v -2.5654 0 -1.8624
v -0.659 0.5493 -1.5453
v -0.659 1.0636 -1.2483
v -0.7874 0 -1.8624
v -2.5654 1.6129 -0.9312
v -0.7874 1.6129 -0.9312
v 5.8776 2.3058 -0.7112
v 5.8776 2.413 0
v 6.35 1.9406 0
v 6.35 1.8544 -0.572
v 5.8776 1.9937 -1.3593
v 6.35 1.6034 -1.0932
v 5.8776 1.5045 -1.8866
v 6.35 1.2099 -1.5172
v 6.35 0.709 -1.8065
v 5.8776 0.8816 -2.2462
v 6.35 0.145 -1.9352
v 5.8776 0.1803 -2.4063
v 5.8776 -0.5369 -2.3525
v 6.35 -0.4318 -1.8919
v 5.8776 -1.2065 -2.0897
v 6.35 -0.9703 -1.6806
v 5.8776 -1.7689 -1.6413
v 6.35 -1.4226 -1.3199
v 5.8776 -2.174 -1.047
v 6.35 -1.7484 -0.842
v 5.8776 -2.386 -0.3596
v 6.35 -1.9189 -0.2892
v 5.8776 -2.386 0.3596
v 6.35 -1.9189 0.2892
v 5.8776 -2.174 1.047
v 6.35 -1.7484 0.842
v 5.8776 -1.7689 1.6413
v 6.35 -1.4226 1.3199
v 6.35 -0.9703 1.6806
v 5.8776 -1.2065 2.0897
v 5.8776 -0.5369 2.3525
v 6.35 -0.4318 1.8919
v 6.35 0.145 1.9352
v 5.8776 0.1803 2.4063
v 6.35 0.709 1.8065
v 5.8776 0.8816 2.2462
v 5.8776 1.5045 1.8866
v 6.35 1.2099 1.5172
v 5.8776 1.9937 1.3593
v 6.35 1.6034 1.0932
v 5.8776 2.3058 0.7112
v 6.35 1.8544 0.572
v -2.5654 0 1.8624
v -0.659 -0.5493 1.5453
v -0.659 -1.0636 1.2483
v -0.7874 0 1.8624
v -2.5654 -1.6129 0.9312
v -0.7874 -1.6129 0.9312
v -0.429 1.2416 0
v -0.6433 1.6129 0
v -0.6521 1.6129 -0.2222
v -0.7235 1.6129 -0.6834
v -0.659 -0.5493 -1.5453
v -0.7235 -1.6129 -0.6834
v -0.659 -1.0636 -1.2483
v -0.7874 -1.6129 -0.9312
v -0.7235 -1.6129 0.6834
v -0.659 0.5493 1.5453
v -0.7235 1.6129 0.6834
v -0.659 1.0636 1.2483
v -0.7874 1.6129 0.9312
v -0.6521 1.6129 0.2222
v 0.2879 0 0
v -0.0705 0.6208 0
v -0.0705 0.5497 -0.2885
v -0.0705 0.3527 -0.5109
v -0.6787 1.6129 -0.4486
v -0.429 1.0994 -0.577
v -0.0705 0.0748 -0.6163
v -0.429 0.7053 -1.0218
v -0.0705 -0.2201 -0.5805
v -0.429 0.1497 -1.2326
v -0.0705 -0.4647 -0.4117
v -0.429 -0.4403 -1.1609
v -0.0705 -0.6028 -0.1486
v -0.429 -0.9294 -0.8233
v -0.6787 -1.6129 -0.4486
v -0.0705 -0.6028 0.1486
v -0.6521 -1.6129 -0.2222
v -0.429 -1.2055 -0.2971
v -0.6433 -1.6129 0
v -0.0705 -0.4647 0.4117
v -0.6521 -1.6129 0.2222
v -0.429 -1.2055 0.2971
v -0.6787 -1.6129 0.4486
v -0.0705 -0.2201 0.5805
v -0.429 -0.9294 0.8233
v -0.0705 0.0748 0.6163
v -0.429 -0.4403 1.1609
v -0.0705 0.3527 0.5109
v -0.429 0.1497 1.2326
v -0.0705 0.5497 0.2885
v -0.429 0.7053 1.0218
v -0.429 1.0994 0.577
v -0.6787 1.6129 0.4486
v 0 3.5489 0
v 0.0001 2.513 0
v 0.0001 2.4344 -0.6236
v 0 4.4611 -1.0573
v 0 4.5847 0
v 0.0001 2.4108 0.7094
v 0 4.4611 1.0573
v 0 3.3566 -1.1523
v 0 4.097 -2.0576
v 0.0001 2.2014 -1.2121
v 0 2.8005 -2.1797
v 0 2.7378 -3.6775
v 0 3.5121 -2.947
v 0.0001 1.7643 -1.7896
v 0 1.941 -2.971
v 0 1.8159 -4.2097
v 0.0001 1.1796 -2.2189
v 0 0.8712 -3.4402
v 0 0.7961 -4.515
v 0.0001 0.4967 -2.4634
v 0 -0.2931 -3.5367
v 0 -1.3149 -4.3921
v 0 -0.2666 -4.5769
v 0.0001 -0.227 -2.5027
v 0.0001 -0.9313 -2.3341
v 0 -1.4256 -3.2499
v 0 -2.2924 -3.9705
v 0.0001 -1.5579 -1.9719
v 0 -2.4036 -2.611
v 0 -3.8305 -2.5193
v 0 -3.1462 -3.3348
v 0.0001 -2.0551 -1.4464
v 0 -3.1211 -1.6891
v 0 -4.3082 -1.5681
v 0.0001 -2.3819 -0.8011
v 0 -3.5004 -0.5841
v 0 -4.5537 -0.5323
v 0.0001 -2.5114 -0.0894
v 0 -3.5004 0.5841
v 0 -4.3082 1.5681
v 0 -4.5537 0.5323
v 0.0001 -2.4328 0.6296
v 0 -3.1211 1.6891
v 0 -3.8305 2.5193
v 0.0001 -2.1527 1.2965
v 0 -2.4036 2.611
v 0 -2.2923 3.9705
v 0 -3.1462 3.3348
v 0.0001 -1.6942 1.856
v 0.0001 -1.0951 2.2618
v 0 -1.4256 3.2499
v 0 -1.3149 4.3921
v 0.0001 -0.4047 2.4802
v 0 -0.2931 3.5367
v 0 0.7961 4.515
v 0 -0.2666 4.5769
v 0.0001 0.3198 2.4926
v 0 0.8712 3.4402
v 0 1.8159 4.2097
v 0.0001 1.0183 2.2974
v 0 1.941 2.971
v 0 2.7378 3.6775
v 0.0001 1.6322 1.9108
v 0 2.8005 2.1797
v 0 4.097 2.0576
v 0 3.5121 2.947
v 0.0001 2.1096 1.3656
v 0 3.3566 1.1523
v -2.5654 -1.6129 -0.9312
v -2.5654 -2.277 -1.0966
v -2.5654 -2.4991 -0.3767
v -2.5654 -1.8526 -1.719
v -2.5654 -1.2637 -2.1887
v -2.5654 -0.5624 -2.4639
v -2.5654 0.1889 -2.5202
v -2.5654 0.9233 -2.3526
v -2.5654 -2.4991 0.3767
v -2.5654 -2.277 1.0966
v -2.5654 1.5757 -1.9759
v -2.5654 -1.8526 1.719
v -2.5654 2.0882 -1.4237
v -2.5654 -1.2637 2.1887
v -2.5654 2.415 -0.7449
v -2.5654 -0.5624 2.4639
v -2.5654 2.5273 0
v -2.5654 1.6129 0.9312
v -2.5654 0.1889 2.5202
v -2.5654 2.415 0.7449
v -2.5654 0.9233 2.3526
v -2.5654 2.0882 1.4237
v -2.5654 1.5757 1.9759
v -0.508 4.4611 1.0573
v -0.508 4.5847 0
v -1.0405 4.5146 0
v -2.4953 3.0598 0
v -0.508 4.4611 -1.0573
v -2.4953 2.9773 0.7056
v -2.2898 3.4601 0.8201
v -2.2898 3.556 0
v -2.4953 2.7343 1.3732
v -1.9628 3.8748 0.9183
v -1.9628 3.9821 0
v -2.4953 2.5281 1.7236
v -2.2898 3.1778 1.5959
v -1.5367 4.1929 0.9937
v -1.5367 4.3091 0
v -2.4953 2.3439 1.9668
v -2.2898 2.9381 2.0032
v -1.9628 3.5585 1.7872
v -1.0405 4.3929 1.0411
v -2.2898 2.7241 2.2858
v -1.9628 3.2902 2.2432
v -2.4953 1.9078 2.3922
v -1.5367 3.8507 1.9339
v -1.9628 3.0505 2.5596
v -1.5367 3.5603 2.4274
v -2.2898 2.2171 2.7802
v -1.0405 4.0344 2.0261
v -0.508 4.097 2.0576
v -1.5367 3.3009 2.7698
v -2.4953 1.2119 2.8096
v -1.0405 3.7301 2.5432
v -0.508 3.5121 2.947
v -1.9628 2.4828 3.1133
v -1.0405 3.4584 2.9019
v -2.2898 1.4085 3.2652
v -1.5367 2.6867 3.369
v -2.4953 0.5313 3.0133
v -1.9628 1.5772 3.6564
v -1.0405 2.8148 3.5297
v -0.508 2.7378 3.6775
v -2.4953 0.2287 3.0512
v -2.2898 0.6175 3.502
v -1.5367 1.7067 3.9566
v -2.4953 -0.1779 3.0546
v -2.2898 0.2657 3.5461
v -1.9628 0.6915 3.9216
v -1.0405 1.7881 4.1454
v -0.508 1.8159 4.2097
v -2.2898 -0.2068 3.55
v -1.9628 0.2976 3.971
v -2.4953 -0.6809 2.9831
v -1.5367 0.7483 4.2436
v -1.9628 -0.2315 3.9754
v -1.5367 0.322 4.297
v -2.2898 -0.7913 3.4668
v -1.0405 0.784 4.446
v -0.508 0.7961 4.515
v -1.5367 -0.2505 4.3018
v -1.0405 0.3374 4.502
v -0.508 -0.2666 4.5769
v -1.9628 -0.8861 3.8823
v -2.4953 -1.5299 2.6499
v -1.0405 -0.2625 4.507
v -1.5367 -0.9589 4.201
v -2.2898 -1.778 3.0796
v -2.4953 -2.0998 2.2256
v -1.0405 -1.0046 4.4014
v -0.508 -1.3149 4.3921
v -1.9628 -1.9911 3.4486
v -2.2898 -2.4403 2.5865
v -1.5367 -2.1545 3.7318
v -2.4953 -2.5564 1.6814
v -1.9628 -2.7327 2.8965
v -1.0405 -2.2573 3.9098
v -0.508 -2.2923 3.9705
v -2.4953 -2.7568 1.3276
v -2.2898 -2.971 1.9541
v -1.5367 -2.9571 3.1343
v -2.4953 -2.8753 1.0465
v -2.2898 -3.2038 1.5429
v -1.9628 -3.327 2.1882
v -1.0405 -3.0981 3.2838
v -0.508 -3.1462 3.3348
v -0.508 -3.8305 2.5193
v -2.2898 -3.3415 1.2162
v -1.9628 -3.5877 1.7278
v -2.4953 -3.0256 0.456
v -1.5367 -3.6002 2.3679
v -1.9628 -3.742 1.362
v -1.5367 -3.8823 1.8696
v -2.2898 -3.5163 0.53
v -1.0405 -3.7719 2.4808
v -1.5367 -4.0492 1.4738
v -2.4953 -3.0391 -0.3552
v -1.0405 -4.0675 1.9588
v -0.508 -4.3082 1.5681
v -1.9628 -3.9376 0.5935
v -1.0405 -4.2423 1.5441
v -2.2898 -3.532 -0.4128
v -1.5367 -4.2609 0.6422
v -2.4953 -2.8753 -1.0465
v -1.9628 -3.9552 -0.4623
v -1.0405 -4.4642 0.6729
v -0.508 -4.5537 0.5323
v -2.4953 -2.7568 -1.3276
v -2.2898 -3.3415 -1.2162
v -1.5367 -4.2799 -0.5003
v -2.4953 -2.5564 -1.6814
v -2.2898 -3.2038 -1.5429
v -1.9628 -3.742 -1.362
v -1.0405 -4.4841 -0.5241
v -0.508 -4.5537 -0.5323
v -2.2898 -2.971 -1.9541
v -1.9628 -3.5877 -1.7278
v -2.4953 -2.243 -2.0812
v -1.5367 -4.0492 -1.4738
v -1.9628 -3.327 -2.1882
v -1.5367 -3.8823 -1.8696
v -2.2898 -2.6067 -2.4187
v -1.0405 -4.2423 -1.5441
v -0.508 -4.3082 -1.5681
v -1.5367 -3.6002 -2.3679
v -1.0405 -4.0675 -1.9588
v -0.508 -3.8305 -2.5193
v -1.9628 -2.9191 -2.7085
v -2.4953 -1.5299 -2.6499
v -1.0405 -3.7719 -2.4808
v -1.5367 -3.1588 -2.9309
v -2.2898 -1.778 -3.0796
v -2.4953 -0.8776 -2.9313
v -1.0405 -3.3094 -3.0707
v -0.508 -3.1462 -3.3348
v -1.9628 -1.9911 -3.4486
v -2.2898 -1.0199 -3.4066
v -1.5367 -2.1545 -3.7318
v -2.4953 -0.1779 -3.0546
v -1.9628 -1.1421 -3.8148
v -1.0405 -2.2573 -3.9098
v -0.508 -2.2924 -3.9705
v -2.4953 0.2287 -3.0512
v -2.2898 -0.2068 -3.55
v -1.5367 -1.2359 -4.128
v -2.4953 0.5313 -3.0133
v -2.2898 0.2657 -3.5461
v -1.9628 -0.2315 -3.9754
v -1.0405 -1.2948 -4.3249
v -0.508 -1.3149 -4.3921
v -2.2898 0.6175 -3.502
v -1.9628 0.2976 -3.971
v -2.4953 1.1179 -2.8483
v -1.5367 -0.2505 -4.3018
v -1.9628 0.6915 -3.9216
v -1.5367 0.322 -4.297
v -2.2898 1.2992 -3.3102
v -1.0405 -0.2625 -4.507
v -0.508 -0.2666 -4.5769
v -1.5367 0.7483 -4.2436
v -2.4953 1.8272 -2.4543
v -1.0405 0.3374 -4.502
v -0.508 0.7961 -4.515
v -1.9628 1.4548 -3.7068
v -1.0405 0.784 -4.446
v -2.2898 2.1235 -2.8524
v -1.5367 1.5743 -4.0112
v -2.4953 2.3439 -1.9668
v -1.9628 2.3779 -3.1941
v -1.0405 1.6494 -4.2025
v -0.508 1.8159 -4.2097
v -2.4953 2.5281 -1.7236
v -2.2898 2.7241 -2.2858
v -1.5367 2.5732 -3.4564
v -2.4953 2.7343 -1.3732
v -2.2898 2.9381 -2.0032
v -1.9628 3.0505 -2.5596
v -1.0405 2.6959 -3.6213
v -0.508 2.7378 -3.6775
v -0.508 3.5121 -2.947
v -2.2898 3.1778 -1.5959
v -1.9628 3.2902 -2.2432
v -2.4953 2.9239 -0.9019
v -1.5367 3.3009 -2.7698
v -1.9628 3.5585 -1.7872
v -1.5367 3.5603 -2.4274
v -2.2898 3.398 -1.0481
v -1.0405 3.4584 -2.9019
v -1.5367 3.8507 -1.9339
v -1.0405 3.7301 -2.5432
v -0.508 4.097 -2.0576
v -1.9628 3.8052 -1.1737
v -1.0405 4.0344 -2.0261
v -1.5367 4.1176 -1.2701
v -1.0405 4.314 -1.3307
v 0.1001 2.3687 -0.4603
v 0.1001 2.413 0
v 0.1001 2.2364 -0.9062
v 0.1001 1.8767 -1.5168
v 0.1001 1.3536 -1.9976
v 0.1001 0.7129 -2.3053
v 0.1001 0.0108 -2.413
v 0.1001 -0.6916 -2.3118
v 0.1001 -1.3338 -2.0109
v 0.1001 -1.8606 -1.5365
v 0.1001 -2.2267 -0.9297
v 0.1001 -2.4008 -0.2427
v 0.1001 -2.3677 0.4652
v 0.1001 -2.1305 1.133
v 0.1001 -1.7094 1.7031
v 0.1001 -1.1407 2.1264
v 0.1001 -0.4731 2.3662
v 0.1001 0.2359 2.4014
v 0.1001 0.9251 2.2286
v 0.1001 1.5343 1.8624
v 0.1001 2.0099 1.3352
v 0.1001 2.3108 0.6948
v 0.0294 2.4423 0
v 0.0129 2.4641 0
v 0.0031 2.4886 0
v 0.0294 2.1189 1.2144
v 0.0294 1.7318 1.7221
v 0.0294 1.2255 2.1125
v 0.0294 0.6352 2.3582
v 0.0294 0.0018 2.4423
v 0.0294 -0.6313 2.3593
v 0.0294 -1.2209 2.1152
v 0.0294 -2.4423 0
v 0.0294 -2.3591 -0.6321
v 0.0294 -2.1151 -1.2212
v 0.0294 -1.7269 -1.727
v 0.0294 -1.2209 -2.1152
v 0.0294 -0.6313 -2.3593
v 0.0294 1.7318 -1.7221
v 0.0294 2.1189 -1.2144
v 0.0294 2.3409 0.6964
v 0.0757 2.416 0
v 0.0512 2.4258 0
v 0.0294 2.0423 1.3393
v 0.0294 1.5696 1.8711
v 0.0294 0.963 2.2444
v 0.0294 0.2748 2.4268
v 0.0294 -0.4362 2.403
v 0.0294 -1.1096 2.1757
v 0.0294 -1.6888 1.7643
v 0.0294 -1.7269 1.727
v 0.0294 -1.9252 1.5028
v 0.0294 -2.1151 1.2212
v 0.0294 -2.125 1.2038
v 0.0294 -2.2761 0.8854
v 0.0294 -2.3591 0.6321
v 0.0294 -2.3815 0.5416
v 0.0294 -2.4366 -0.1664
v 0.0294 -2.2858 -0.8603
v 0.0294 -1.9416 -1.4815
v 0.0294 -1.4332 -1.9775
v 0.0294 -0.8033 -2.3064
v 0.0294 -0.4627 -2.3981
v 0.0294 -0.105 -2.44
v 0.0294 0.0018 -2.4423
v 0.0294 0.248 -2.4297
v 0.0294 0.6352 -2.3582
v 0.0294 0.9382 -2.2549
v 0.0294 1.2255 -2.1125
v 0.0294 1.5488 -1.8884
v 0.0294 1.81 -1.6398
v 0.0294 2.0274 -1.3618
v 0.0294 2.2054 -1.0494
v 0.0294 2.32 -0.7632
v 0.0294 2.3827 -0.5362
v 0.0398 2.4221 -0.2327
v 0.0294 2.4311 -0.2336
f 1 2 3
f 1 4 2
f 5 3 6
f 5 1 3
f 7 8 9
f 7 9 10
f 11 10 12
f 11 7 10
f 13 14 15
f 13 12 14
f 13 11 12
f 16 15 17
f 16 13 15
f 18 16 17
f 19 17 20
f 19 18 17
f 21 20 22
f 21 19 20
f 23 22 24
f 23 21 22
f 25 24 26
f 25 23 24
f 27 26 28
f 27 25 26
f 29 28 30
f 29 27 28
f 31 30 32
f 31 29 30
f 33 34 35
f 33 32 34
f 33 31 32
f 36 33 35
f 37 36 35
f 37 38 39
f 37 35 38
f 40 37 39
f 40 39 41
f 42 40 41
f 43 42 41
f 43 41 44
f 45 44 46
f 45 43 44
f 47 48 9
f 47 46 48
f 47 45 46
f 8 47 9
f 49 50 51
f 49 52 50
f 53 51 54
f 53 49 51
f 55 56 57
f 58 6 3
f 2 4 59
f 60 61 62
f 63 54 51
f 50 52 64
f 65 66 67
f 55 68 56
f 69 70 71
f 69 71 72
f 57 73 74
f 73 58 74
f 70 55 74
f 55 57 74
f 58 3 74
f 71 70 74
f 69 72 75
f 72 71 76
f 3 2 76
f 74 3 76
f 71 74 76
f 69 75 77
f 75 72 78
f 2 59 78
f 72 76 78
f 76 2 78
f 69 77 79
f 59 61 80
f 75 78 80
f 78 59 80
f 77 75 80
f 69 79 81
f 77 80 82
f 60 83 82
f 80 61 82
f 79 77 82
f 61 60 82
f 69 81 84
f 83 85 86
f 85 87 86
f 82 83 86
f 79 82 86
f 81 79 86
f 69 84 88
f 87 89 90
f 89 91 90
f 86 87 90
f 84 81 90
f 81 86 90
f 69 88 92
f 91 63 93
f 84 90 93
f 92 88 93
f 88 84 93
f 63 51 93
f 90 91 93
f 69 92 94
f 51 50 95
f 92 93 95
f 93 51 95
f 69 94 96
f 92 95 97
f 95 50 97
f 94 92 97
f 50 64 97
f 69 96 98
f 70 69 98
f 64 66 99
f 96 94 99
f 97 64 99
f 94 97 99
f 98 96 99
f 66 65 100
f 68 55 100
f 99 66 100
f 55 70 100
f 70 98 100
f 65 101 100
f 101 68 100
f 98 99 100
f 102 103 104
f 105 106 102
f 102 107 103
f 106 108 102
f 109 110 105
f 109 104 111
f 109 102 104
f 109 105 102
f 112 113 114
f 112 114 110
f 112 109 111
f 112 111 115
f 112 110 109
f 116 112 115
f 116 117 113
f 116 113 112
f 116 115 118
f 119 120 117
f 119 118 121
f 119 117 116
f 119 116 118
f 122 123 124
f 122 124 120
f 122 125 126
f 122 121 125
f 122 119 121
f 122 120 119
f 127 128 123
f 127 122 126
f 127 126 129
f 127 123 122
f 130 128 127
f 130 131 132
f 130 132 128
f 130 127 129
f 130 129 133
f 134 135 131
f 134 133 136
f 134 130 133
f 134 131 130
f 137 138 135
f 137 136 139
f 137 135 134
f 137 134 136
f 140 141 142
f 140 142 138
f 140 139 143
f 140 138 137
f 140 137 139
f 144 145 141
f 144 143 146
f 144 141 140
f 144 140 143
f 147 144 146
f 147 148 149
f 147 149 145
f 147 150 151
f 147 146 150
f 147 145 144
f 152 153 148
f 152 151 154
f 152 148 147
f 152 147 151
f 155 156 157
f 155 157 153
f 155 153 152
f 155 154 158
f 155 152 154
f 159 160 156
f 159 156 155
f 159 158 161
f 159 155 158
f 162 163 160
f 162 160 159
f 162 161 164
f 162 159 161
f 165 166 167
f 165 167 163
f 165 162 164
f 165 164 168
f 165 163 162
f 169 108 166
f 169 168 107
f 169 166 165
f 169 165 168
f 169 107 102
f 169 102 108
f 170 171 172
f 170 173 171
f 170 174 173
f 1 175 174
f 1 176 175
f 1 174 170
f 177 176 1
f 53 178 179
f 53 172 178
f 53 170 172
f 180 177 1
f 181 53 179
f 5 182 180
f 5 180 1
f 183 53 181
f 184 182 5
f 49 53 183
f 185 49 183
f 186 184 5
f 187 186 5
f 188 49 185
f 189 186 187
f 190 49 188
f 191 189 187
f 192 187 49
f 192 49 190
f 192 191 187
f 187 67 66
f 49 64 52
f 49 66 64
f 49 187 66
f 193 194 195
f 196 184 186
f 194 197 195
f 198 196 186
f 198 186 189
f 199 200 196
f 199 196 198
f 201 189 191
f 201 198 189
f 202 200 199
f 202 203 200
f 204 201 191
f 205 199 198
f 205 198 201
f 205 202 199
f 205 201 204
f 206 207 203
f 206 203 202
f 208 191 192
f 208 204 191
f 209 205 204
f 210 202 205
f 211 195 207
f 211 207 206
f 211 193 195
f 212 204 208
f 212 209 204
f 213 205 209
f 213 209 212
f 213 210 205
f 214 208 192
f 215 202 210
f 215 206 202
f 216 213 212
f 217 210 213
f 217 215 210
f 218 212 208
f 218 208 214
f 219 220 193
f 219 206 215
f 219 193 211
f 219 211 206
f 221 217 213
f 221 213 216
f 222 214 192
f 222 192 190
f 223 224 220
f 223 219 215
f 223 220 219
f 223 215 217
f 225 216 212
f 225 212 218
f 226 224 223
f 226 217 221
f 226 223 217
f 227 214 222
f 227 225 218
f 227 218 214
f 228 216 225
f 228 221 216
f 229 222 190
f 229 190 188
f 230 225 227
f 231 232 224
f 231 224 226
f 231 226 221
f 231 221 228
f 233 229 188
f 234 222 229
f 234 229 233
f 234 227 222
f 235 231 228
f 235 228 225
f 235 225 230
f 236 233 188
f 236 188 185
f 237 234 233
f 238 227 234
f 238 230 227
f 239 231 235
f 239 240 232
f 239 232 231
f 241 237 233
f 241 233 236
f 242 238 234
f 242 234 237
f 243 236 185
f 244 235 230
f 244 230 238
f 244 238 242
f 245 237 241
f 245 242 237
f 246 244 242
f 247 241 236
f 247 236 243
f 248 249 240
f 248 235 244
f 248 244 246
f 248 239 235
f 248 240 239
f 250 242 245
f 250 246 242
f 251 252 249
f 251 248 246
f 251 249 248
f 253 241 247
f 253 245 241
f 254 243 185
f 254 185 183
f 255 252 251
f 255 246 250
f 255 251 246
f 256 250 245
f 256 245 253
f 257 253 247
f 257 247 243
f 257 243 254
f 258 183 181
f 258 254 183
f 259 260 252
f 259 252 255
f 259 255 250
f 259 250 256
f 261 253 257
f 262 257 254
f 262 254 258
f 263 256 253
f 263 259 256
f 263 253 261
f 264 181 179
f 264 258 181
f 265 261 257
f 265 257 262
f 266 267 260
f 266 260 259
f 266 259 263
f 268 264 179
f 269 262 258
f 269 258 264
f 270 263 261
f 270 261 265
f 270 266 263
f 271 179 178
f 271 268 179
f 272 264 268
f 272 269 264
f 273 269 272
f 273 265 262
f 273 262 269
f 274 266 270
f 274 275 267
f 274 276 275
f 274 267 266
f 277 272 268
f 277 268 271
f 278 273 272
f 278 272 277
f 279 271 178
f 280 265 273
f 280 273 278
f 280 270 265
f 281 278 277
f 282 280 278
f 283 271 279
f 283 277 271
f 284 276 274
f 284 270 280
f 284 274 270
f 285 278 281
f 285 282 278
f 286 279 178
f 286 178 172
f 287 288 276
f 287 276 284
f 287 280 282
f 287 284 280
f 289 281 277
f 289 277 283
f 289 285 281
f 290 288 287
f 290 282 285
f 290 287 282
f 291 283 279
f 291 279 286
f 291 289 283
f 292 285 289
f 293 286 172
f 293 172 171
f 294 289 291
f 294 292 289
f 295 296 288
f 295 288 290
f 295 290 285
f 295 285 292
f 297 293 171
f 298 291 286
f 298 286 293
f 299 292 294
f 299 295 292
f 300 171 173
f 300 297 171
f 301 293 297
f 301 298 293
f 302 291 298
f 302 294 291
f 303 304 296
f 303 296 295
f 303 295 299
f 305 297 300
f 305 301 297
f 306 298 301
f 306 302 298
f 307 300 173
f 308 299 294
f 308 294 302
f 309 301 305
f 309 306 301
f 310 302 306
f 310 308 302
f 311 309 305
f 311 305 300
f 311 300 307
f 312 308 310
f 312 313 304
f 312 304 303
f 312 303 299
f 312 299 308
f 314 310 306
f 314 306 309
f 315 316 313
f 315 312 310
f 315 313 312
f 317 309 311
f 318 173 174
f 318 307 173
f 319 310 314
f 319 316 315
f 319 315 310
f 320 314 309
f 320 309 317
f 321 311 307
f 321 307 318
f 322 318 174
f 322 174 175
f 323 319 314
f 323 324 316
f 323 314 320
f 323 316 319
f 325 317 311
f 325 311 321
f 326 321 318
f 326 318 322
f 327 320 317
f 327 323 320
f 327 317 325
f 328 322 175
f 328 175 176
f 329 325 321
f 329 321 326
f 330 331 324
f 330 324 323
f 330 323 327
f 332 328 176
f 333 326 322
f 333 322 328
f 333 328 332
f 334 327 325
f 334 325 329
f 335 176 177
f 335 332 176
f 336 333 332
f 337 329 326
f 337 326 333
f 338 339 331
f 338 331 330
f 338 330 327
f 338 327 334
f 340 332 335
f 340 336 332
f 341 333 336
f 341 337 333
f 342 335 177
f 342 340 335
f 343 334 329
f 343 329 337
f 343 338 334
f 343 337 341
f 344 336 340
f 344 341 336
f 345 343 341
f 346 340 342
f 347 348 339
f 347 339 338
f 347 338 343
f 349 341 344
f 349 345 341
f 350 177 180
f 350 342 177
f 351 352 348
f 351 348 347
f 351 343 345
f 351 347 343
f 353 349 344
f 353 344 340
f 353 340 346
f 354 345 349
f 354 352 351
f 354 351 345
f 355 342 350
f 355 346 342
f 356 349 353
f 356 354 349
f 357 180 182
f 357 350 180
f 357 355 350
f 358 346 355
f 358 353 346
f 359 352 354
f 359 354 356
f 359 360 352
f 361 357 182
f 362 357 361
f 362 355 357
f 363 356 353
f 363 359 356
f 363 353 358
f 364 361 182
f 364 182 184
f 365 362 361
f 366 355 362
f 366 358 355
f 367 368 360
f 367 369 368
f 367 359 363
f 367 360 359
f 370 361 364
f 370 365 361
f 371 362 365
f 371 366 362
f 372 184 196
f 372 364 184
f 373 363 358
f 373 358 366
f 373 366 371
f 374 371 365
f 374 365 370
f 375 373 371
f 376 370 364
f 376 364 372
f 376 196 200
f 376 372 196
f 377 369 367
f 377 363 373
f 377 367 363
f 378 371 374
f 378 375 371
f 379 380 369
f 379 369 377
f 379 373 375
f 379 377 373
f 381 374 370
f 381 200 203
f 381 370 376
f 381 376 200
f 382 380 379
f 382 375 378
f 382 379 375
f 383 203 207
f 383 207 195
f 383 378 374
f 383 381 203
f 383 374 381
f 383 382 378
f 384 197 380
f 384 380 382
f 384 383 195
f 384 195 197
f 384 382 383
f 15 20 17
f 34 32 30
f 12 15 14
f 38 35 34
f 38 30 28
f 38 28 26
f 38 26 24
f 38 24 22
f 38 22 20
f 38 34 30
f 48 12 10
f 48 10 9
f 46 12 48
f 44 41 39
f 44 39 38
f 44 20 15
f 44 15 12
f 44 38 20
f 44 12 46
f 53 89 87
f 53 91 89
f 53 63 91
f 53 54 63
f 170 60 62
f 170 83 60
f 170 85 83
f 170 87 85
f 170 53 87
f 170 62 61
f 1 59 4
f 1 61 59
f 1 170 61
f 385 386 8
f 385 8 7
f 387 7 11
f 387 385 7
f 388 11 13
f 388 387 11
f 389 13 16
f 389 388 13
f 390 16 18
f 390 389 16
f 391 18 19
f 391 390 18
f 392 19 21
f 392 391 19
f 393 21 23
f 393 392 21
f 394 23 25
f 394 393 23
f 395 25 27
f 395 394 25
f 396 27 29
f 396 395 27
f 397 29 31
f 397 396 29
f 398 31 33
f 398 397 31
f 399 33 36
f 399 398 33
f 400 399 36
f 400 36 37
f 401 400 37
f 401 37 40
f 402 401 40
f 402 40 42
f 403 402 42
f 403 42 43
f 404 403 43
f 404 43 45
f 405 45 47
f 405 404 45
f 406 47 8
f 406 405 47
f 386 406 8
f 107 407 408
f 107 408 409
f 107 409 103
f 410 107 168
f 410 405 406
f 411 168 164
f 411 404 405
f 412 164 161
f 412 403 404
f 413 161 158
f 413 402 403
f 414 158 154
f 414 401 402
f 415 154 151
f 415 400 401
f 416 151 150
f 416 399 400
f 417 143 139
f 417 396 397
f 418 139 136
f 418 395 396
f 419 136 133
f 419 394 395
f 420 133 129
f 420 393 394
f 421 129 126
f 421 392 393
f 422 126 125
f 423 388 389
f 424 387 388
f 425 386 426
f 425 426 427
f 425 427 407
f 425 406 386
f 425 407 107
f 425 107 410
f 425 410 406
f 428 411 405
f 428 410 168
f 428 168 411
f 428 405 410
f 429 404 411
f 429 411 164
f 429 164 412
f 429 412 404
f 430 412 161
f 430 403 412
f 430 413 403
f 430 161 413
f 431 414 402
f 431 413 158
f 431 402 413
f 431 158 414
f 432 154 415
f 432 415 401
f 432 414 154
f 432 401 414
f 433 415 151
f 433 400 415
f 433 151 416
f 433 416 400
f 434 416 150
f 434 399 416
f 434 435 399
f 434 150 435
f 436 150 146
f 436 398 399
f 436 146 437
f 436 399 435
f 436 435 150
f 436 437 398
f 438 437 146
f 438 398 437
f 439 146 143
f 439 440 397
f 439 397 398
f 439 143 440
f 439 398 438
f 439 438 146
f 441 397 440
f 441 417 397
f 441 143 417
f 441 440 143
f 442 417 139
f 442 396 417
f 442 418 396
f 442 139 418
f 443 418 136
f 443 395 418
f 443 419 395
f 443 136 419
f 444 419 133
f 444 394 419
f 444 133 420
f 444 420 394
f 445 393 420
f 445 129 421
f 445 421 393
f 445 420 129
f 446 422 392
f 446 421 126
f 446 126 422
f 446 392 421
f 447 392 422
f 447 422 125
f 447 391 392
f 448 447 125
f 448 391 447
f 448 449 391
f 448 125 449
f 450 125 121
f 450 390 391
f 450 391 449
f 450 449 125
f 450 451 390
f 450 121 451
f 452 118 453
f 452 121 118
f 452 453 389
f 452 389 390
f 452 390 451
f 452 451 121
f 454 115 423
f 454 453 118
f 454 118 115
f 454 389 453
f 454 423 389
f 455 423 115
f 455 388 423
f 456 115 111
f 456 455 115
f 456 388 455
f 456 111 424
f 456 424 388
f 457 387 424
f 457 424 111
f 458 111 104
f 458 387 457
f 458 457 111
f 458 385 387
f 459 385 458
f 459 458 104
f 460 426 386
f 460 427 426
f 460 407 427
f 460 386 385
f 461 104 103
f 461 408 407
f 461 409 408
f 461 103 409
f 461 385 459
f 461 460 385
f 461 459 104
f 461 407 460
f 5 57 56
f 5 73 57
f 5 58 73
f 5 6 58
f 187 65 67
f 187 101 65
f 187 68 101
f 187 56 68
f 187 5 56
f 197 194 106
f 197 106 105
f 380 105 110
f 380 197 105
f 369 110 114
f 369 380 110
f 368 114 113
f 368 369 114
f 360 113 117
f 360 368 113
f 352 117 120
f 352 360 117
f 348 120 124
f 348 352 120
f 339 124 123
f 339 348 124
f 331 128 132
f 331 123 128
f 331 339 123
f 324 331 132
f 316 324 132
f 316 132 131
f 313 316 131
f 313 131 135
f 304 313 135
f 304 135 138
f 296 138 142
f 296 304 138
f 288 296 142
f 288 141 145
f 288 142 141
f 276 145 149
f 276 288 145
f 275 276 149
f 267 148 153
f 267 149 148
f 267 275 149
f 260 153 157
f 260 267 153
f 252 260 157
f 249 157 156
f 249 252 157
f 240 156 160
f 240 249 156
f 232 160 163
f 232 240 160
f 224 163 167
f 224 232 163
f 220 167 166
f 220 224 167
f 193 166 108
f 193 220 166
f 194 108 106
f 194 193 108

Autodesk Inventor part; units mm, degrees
ref_plane "YZ Plane" through (0, 0, 0) normal (1, 0, 0) x (0, 1, 0)
ref_plane "XZ Plane" through (0, 0, 0) normal (0, 1, 0) x (-1, 0, 0)
sketch "Sketch1" plane through (0, 0, 0) normal (0, 0, 1) x (1, 0, 0)
  line L0 (0.2879, 0) -> (6.35, 0)
  line L1 (6.35, 0) -> (6.35, 2.413)
  line L2 (6.35, 2.413) -> (2.1084, 2.413)
  line L3 (2.1084, 2.413) -> (0.0001, 2.413)
  line L4 (0.0001, 2.413) -> (0, 2.413)
  line L5 (0, 2.413) -> (0, 4.5847)
  line L6 (0, 4.5847) -> (-2.5654, 4.5847)
  line L7 (-2.5654, 4.5847) -> (-2.5654, 1.8624)
  line L8 (-2.5654, 1.8624) -> (-0.7874, 1.8624)
  line L9 (-0.7874, 1.8624) -> (0.2879, 0)
  line L10 (-4.3485, 0) -> (8.1331, 0) projected
  line L11 (0, -0.9169) -> (0, 5.5016) projected
  line L12 (2.1084, 2.413) -> (0, 2.413) construction
  dimension "d1" = 4.2416
  dimension "d2" = 2.1083
  dimension "d3" = 2.5654
  dimension "d4" = 1.778
  dimension "d5" = 60
  dimension "d6" = 4.826
  dimension "d7" = 4.826
  dimension "d8" = 3.7248
  dimension "d9" = 9.1694
  dimension "d26" = 6.35
revolve "Body" add sketch "Sketch1" angle 360 about axis through (0.2879, 0, 0) along (1, 0, 0) contours L9 L11 L3 L2 L1 L0 | L9 L8 L7 L6 L5 L11
sketch "Sketch2" plane through (-2.5654, 0, 0) normal (-1, 0, 0) x (0, 0, 1)
  circle A0 centre (0, 0) radius 1.8624 projected
  line L0 (0, -6.4186) -> (0, 6.4186) projected
  line L1 (-6.4186, 0) -> (6.4186, 0) projected
  line L2 (1.8624, 0) -> (0.9312, -1.6129)
  line L3 (0.9312, -1.6129) -> (-0.9312, -1.6129)
  line L4 (-0.9312, -1.6129) -> (-1.8624, 0)
  line L5 (-1.8624, 0) -> (-0.9312, 1.6129)
  line L6 (-0.9312, 1.6129) -> (0.9312, 1.6129)
  line L7 (0.9312, 1.6129) -> (1.8624, 0)
  point P0 (0, 0)
extrude "Slot" add sketch "Sketch2" against normal up to next contours L7 A0 | A0 L2 | L6 L0 A0 | A0 L0 L3 | L0 L6 A0 | A0 L3 L0 | L4 A0 | A0 L5
fillet "Fillet1" radius 2.0574 1 edges at (-2.5654, -4.5847, 0)
thread "Thread" size "10-32 UNF" class "2A" standard "ANSI Unified Screw Threads" length 4.2416
chamfer "Chamfer1" distance 0.4724 distance2 0.4724 1 edges at (6.35, -2.413, 0) measured on face at (6.35, -0.2686, 0.7084)
ref_plane "Work Plane1" through (29, 0, 0) normal (0, -1, 0) x (1, 0, 0)
fillet "Fillet2" radius 0.1 1 edges at (0.0001, -2.413, 0)
equation "\"d30\" = R"
equation "\"d17\" = RR"
equation "\"d13\" = GEL"
equation "\"d15\" = -0.5 * SPD + 0.5 * GD"
equation "\"d16\" = GUL"
equation "\"d1\" = GEL"
equation "\"d3\" = KOH"
equation "\"d4\" = INTI"
equation "\"d6\" = GD"
equation "\"d7\" = BDM"
equation "\"d8\" = 1.1547 * SW"
equation "\"d9\" = KOD"
equation "\"d26\" = NLG"
equation "\"GD\" = NND"
equation "\"NLG\" = 6.35"
equation "\"GEL\" = 4.2416"
equation "\"KOD\" = 9.1694"
equation "\"KOH\" = 2.5654"
equation "\"INTI\" = 1.778"
equation "\"GAL\" = 2.1082"
equation "\"GUL\" = 0.47244"
equation "\"BDM\" = NND"
equation "\"SW\" = 3.2258"
equation "\"RR\" = 2.0574"
equation "\"SPD\" = 3.88112"
equation "\"R\" = 0.1"
equation "\"TOA\" = 30deg"
equation "\"GD1\" = SPD"
equation "\"THREADDIA\" = 4.826"
equation "\"KOH1\" = 0.508"
equation "\"NND\" = 4.826"
equation "\"E0\" = 3.72593"
properties part number "ANSI B18.3 - No. 10-32 - 1/4, HSBHCSI" material "Steel, Mild"
